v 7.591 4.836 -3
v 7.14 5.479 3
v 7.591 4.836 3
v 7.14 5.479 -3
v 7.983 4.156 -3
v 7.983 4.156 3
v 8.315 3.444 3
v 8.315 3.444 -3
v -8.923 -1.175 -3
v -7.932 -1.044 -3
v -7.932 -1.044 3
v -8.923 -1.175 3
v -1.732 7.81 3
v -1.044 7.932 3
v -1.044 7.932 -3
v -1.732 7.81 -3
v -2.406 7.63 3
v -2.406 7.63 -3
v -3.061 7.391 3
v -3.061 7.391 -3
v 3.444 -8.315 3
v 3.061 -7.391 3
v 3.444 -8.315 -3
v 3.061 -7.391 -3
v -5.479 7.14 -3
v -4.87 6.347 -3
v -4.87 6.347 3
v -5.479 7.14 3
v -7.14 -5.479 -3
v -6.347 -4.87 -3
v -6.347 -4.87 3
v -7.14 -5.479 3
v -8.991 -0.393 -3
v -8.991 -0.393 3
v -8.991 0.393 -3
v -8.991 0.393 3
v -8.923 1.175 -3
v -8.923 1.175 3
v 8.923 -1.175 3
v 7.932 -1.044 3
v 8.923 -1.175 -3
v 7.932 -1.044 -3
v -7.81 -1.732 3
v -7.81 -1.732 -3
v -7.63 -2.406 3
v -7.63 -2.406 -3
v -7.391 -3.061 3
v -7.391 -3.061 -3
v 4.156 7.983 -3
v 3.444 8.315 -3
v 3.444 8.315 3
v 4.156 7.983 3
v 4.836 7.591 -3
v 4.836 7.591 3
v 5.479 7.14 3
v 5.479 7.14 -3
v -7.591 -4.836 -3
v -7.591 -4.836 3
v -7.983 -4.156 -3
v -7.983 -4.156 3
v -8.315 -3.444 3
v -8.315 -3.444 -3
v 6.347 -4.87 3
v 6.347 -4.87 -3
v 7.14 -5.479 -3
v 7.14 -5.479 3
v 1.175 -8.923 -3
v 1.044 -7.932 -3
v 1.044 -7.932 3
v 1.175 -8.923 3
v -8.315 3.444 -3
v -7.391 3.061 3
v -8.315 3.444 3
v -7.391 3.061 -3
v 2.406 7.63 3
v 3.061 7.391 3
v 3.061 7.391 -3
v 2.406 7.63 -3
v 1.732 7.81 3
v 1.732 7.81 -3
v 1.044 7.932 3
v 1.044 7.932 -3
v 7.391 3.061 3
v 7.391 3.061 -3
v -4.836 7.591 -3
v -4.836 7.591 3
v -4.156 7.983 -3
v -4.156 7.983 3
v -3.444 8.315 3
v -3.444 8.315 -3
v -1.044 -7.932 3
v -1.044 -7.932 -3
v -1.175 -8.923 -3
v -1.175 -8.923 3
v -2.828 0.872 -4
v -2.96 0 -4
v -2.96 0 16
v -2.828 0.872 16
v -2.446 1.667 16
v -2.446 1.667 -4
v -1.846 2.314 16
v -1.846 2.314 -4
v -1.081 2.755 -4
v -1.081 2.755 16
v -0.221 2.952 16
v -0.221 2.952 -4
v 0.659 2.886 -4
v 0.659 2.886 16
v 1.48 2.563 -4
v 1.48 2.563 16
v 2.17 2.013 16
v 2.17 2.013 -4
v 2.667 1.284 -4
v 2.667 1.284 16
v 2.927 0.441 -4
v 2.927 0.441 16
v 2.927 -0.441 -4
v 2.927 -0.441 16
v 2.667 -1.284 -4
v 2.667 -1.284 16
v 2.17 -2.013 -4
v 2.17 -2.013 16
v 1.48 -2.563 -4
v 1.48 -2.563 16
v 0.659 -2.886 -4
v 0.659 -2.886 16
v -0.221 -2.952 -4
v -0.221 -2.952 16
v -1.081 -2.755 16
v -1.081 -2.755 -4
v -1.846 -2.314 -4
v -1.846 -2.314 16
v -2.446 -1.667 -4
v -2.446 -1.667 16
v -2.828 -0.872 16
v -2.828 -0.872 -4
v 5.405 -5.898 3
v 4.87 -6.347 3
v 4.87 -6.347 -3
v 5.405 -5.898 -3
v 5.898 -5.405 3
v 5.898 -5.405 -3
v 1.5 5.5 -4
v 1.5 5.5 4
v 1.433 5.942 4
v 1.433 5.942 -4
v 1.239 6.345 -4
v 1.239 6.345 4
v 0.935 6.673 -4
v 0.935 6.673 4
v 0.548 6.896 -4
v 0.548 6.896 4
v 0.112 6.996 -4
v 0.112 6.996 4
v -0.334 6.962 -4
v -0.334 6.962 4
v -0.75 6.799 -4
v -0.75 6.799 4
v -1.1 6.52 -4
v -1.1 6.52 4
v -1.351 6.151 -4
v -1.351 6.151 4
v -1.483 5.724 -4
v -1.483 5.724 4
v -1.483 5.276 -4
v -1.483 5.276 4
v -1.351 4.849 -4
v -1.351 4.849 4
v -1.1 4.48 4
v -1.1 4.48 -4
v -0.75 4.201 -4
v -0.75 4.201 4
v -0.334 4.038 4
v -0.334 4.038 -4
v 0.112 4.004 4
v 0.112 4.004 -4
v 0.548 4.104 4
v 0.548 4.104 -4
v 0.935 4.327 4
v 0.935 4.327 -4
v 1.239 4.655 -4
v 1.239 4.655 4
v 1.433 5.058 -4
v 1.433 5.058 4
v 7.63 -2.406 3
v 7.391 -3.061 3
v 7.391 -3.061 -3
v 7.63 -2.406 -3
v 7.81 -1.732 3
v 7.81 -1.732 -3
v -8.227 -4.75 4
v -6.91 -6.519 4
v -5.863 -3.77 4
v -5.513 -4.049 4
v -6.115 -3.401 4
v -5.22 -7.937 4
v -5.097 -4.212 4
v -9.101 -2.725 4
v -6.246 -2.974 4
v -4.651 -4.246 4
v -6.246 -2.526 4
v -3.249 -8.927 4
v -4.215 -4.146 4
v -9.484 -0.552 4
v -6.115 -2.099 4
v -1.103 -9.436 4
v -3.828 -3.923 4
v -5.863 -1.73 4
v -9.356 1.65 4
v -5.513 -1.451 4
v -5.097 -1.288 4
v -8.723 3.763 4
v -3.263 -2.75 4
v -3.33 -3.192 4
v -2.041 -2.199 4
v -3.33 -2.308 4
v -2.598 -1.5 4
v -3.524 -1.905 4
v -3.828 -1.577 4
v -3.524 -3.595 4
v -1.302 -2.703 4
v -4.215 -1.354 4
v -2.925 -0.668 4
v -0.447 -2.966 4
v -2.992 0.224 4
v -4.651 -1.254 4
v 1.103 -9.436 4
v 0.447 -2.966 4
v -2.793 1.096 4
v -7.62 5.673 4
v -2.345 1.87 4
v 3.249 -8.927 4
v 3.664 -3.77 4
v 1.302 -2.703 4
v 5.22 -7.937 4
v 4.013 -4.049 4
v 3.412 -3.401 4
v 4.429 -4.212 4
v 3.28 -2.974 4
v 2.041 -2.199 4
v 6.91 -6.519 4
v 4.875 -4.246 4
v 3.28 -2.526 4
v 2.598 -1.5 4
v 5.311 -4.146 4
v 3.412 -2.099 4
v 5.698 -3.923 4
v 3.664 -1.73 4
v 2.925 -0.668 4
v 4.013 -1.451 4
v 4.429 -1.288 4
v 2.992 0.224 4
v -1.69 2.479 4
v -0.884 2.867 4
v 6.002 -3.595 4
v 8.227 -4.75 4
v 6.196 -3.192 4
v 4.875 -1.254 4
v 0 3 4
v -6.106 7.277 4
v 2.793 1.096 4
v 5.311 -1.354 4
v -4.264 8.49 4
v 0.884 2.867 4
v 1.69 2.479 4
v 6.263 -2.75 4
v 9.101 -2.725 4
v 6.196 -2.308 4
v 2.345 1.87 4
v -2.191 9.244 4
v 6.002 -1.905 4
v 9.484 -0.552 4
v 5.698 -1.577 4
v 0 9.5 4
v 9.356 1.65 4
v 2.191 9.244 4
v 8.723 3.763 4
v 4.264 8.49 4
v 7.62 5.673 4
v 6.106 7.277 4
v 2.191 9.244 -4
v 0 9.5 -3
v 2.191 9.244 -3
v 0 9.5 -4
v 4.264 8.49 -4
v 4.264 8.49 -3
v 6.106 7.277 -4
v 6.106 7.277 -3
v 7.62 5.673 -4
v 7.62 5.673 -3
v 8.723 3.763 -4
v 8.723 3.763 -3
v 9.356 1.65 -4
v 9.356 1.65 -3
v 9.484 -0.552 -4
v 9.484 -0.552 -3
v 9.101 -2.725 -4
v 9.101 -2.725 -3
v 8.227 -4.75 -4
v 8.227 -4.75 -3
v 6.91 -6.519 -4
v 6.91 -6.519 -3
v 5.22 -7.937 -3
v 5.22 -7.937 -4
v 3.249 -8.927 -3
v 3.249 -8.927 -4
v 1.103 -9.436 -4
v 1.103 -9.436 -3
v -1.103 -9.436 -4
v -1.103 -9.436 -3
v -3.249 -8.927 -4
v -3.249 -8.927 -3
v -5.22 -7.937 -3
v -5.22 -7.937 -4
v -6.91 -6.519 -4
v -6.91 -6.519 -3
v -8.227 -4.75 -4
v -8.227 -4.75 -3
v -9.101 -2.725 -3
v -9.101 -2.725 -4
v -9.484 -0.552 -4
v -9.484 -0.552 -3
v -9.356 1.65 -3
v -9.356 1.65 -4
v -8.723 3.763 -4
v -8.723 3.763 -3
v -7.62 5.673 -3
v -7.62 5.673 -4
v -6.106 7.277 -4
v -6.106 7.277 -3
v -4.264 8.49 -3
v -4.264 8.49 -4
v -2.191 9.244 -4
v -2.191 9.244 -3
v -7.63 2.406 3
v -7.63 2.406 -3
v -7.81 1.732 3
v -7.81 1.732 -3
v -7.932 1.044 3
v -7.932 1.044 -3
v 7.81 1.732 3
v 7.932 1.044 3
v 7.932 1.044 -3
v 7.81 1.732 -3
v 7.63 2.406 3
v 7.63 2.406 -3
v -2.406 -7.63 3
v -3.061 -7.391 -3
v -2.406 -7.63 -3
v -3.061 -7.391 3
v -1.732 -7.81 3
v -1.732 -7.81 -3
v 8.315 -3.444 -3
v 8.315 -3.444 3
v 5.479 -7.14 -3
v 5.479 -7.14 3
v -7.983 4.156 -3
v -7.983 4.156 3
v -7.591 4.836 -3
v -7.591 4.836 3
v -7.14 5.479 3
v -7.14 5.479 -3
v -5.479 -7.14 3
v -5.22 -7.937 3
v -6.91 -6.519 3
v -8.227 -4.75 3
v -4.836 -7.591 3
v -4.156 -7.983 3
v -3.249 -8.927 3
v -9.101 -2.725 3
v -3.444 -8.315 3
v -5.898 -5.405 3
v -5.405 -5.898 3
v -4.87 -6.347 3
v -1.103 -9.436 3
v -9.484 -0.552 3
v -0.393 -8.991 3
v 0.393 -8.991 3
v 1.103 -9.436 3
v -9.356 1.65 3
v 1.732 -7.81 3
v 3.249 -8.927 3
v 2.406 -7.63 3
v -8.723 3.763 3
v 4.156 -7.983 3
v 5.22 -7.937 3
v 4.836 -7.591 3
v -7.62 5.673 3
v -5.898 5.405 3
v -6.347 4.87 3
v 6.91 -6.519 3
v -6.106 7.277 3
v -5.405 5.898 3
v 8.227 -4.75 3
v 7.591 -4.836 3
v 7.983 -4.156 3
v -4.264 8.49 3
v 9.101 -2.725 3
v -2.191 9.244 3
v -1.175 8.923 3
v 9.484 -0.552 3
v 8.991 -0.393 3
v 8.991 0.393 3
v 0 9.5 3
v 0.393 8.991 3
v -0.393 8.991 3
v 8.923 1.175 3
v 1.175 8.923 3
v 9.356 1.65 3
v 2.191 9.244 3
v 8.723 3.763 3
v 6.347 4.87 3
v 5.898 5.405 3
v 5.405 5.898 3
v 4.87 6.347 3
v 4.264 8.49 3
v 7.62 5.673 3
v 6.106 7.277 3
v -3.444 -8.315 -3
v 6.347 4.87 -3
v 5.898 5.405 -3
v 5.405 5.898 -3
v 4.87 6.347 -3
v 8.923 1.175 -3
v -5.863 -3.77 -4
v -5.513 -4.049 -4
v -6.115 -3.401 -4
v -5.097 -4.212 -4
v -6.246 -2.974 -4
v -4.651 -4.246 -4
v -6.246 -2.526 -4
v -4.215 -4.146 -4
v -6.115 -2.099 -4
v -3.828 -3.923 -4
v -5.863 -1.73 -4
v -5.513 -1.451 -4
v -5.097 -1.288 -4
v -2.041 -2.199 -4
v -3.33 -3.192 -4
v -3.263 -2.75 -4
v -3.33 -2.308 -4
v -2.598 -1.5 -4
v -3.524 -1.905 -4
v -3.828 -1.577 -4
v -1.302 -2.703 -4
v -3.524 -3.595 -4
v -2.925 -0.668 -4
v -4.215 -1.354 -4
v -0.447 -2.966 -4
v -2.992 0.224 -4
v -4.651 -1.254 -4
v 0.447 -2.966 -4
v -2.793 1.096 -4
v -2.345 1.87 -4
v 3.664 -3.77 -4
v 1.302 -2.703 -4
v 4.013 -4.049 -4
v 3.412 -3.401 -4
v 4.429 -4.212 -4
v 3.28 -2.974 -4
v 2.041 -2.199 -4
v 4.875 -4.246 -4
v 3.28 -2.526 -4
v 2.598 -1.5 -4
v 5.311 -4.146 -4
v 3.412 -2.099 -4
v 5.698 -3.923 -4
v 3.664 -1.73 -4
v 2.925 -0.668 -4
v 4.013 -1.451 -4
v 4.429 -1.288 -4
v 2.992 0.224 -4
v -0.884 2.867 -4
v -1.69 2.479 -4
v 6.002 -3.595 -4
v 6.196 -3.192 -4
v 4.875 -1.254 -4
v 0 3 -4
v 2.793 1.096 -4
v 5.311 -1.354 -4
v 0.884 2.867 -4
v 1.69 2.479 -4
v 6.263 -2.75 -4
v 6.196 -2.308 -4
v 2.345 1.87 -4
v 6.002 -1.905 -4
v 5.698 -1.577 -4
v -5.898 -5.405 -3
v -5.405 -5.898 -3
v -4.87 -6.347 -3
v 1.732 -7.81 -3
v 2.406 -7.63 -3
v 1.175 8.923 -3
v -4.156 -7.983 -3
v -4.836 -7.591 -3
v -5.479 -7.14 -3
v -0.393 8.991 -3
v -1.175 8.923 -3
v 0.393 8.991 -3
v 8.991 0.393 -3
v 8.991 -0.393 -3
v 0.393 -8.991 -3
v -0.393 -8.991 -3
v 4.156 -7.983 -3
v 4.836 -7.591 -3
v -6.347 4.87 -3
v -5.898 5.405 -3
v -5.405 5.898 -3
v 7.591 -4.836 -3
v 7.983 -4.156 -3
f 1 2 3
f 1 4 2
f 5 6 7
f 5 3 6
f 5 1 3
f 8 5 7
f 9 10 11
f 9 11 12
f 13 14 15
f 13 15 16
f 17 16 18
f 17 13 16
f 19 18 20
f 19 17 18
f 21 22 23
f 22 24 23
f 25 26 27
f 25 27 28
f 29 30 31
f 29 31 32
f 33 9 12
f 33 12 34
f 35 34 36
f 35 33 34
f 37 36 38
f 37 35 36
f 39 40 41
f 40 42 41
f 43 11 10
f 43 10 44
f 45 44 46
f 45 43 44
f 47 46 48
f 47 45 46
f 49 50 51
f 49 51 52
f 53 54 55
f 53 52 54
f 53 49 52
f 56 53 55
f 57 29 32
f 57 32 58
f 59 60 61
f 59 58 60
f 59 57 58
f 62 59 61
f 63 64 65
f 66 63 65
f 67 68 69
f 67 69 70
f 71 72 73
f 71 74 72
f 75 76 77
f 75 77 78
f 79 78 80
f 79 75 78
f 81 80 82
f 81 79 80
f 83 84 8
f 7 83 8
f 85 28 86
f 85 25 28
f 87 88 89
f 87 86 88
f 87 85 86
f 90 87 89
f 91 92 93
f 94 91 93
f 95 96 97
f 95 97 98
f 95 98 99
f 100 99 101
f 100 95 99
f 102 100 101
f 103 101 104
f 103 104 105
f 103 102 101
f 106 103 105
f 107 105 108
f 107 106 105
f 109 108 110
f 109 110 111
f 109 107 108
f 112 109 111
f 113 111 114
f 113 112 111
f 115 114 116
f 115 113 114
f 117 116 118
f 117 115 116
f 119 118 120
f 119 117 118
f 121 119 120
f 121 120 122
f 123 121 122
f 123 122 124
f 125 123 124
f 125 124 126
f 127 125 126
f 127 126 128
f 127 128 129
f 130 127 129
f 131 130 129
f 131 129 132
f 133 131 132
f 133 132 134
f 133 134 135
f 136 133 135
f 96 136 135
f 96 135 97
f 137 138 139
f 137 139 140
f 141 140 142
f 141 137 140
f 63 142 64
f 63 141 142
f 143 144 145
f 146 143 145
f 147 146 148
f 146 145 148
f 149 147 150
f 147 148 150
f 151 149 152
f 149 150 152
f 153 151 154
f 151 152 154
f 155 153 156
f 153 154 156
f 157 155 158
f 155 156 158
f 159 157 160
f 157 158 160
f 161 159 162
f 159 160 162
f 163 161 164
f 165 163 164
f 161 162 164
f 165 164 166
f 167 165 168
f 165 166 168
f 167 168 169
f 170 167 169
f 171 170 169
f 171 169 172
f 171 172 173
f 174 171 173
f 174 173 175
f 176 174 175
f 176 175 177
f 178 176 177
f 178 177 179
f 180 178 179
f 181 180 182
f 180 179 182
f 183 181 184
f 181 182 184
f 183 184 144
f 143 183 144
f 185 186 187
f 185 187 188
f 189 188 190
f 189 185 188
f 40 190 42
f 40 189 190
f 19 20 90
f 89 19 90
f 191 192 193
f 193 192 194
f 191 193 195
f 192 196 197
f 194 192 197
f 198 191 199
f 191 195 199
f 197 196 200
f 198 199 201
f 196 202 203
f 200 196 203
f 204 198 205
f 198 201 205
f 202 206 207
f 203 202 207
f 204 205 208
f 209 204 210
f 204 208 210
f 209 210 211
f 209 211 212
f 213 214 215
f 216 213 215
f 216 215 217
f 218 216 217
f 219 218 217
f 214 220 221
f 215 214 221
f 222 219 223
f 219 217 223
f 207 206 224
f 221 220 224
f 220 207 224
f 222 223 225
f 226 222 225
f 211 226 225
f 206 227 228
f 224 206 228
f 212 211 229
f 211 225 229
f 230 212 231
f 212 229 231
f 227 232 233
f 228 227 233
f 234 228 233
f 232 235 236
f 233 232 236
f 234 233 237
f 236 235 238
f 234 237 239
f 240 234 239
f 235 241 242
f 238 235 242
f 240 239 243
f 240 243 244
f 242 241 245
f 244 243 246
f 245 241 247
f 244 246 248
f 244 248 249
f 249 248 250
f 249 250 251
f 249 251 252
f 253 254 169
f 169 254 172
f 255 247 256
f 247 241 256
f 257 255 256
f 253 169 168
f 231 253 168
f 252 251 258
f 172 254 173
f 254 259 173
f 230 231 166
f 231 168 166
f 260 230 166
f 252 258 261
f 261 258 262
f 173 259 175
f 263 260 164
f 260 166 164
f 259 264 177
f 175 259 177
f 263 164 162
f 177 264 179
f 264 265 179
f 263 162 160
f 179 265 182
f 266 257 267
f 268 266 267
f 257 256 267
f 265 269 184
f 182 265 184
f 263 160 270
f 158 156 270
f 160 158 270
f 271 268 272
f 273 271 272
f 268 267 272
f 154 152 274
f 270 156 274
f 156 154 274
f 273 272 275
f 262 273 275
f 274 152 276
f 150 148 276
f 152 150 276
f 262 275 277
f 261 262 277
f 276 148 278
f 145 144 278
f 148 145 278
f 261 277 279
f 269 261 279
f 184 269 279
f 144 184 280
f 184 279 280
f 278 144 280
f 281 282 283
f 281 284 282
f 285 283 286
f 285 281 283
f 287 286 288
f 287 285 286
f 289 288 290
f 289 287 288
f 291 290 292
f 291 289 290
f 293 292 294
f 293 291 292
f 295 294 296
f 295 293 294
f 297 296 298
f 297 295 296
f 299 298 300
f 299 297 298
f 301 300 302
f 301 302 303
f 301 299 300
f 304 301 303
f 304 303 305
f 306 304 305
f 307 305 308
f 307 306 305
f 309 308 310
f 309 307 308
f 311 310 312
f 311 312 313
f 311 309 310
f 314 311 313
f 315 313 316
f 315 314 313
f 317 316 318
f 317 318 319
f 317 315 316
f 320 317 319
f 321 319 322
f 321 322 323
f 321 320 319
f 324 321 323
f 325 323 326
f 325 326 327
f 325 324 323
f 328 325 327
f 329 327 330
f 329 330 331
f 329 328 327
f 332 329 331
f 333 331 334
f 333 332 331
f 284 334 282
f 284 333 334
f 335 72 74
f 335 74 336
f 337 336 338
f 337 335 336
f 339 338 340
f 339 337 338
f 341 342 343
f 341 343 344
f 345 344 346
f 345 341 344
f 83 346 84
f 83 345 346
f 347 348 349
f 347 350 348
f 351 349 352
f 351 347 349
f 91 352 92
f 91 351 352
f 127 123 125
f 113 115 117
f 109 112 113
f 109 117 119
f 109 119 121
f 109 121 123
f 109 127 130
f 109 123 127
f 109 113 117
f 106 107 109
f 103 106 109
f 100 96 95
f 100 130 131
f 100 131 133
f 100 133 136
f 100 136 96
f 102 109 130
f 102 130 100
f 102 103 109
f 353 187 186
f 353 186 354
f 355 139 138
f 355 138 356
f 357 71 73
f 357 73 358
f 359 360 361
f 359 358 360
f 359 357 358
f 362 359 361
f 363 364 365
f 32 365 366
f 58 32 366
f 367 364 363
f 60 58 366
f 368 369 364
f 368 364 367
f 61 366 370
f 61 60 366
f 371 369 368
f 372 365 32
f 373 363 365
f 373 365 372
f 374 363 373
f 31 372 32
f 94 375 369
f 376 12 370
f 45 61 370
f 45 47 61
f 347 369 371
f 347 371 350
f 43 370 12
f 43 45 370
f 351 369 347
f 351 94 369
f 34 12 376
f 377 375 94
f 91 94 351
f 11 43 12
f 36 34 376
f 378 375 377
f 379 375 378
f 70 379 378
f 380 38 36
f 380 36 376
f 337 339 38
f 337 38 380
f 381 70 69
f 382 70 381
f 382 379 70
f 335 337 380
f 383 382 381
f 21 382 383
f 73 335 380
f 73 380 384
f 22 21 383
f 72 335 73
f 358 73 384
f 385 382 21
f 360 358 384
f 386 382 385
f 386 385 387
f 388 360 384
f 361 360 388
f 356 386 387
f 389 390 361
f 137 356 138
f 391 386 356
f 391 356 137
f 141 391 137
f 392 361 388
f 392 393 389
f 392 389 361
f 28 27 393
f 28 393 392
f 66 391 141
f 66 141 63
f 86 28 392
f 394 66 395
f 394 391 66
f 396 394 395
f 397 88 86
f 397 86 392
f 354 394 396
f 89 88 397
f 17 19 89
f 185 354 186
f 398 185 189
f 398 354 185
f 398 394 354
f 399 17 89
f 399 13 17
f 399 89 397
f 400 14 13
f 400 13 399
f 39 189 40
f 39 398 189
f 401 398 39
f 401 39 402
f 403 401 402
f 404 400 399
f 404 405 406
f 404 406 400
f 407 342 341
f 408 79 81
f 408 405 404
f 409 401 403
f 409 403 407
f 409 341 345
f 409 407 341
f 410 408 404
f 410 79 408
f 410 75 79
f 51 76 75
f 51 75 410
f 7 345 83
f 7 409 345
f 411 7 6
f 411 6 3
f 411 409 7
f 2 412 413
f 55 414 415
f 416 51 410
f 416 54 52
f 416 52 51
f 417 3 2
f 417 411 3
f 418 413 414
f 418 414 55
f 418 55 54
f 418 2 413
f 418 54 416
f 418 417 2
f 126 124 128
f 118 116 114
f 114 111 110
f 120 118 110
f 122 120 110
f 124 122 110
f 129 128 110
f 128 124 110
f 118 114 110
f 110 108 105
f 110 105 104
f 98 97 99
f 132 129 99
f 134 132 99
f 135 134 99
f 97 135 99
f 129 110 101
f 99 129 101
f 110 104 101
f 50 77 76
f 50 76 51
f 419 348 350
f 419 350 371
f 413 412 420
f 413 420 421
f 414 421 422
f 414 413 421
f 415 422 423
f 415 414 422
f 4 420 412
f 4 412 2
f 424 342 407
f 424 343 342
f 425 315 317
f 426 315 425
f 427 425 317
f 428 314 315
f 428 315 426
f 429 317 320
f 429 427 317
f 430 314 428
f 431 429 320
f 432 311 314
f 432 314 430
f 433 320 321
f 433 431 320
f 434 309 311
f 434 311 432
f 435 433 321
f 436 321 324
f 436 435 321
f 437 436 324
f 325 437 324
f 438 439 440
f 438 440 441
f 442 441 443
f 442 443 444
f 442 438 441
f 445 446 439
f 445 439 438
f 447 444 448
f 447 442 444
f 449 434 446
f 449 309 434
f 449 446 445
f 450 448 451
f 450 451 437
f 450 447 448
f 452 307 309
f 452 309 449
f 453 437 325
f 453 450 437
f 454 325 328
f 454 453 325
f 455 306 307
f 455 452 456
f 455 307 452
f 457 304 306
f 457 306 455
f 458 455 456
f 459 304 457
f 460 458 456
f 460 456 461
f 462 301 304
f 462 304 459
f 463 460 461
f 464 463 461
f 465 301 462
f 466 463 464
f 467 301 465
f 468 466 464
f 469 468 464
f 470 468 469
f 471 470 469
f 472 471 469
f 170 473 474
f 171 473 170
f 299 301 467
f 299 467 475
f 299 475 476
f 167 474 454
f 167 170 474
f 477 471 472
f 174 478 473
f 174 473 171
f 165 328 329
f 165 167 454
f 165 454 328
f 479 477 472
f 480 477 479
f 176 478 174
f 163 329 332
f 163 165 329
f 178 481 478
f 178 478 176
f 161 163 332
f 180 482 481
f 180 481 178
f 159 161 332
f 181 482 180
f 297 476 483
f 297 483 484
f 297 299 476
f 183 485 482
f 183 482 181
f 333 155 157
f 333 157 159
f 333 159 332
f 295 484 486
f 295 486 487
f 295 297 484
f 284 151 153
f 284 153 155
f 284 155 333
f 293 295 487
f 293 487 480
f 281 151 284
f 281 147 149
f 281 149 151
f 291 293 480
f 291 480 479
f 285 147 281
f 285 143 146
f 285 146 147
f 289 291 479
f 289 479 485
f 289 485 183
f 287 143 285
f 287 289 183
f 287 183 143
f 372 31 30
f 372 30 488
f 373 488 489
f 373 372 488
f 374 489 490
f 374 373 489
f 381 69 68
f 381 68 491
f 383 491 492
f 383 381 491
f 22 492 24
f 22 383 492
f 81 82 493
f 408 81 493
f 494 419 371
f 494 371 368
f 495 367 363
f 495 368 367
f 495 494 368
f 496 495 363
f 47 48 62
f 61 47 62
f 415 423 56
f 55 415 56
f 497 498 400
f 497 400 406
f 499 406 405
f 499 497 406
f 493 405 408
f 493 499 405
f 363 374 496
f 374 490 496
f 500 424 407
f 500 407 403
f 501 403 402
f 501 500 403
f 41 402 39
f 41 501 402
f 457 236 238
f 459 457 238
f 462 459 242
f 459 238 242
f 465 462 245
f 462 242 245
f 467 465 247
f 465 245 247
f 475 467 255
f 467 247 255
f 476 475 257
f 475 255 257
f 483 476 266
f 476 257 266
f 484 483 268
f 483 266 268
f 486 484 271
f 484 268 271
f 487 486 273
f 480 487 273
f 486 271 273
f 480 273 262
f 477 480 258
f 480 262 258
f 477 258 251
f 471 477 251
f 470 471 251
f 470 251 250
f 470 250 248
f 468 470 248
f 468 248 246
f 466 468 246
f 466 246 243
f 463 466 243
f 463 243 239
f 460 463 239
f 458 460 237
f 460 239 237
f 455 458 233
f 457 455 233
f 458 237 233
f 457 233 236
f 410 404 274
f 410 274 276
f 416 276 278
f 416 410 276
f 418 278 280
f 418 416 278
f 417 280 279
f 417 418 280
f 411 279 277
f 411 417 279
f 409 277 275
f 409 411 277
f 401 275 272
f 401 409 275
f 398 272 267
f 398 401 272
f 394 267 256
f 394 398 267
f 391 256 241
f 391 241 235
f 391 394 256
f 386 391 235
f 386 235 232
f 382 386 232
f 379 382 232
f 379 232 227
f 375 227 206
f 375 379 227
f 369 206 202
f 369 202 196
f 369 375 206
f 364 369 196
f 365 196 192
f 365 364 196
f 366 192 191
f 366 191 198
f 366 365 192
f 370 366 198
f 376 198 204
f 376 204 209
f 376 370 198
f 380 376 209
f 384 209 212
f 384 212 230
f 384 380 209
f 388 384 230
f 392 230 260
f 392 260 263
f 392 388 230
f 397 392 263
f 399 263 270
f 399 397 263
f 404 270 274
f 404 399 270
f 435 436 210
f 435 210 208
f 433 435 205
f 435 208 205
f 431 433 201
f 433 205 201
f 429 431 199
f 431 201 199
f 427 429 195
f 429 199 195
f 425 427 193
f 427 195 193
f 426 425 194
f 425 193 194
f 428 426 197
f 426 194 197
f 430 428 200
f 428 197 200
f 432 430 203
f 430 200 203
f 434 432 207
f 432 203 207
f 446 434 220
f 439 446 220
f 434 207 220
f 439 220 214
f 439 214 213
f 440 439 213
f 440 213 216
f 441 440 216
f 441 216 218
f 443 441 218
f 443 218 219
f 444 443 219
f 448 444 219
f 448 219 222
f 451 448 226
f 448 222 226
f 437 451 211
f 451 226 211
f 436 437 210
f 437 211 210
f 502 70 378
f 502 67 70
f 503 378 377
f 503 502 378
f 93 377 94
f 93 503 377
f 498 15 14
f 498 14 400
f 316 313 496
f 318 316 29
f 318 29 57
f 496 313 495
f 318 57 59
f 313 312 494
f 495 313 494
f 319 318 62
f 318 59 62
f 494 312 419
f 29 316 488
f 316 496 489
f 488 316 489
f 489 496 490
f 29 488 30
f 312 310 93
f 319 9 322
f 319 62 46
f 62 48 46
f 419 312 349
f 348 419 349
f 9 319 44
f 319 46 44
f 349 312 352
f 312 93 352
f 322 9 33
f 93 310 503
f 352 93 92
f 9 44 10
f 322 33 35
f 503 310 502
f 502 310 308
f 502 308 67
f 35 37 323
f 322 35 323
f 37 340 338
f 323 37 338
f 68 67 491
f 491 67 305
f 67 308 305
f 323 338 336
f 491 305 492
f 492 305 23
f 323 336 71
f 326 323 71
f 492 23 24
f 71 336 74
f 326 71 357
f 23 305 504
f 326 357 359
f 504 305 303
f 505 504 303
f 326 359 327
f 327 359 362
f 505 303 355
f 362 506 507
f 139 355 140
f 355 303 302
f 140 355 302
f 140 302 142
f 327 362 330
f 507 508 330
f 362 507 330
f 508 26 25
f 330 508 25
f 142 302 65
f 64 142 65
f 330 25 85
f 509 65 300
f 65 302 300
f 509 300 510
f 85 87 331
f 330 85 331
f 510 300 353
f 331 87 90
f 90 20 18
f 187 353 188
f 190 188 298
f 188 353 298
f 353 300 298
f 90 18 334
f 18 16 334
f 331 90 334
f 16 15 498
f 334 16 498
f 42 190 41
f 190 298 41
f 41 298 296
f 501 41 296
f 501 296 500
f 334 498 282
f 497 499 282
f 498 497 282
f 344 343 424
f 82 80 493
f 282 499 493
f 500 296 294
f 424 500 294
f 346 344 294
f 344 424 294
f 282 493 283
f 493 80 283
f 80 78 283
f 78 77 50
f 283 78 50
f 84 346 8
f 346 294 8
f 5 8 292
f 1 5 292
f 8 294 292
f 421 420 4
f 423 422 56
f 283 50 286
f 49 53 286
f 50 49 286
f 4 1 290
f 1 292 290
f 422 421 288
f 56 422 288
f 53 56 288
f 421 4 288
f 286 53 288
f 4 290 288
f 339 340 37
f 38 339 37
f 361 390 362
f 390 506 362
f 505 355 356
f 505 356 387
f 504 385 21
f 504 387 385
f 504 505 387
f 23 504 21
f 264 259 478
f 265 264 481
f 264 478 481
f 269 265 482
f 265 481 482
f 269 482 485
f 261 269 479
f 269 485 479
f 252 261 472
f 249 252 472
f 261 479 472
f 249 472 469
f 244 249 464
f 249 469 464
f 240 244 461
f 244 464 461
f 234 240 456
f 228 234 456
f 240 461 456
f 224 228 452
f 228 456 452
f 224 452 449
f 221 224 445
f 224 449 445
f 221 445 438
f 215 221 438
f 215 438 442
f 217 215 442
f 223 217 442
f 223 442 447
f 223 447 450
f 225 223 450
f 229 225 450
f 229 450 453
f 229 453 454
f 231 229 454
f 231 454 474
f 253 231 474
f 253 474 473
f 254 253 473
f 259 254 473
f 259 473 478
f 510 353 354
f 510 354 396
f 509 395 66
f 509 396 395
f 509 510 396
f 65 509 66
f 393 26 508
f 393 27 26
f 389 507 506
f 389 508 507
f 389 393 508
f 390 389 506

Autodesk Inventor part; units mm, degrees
ref_plane "YZ Plane" through (0, 0, 0) normal (1, 0, 0) x (0, 1, 0)
ref_plane "XZ Plane" through (0, 0, 0) normal (0, 1, 0) x (-1, 0, 0)
ref_plane "XY Plane" through (0, 0, 0) normal (0, 0, 1) x (1, 0, 0)
sketch "Sketch19" plane through (0, 0, 0) normal (1, 0, 0) x (0, 1, 0)
  line L0 (0, 0) -> (3, 0)
  line L1 (3, 0) -> (3, -4)
  line L2 (3, -4) -> (9.5, -4)
  line L3 (9.5, -4) -> (9.5, 0) construction
  line L4 (9.5, 0) -> (3, 0) construction
  line L5 (9.5, -3) -> (8, -3)
  line L6 (8, -3) -> (8, 0)
  line L7 (0, 0) -> (0, -7.3886)
  line L8 (3, 0) -> (3, 4)
  line L9 (3, 4) -> (9.5, 4)
  line L10 (9.5, 4) -> (9.5, 0) construction
  line L11 (9.5, 3) -> (8, 3)
  line L12 (8, 3) -> (8, 0)
  line L13 (9.5, 4) -> (9.5, 3)
  line L14 (9.5, -3) -> (9.5, -4)
  dimension "d111" = 1
  dimension "d113" = 3
  dimension "d119" = 6
  dimension "d120" = 1.5
  dimension "d121" = 8
revolve "Revolution4" add sketch "Sketch19" angle 360 about axis through (0, 0, 0) along (0, 0, -1)
sketch "Sketch20" plane through (0, 0, -4) normal (0, 0, -1) x (-1, 0, 0)
  circle A0 centre (0, 0) radius 3 projected
  circle A1 centre (0, 0) radius 2.96
  dimension "d116" = 0.04
extrude "Extrusion16" add sketch "Sketch20" against normal blind 20 contours A1
sketch "Sketch21" plane through (0, 0, 4) normal (0, 0, 1) x (1, 0, 0)
  circle A0 centre (0, 0) radius 8 projected
  circle A1 centre (0, 0) radius 2.96 projected
  circle A2 centre (0, 0) radius 2.96 construction
  line L0 (0, 0) -> (0, 3) construction
  circle A3 centre (0, 0) radius 3 construction
  line L1 (0, 3) -> (0, 8) construction
  circle A4 centre (0, 5.5) radius 1.5
  dimension "d122" = 3
extrude "Extrusion17" cut sketch "Sketch21" against normal through all contours A4
pattern_circular "Circular Pattern1" count 3 over 360 about axis through (0, 0, -4) along (0, 0, 1) of "Extrusion17"
sketch "Sketch22" plane through (0, 0, -3) normal (0, 0, 1) x (1, 0, 0)
  circle A0 centre (0, 0) radius 8 projected
  circle A1 centre (0, 0) radius 9
  line L0 (0, 0) -> (-1.1747, 8.923) construction
  line L1 (-1.1747, 8.923) -> (1.1747, 8.923) construction
  circle A2 centre (0, 0) radius 8 construction
  line L2 (1.1747, 8.923) -> (0, 0) construction
  line L3 (-1.0442, 7.9316) -> (-1.1747, 8.923)
  line L4 (1.0442, 7.9316) -> (1.1747, 8.923)
  dimension "d128" = 1
  dimension "d129" = 15
extrude "Extrusion18" add sketch "Sketch22" along normal up to surface (6 mm away) contours A0 L3 A1 L4 picked at (0.1163, 8.6584)
pattern_circular "Circular Pattern2" count 12 over 360 about axis through (0, 0, -4) along (0, 0, 1) of "Extrusion18"
properties part number "Nut3"
